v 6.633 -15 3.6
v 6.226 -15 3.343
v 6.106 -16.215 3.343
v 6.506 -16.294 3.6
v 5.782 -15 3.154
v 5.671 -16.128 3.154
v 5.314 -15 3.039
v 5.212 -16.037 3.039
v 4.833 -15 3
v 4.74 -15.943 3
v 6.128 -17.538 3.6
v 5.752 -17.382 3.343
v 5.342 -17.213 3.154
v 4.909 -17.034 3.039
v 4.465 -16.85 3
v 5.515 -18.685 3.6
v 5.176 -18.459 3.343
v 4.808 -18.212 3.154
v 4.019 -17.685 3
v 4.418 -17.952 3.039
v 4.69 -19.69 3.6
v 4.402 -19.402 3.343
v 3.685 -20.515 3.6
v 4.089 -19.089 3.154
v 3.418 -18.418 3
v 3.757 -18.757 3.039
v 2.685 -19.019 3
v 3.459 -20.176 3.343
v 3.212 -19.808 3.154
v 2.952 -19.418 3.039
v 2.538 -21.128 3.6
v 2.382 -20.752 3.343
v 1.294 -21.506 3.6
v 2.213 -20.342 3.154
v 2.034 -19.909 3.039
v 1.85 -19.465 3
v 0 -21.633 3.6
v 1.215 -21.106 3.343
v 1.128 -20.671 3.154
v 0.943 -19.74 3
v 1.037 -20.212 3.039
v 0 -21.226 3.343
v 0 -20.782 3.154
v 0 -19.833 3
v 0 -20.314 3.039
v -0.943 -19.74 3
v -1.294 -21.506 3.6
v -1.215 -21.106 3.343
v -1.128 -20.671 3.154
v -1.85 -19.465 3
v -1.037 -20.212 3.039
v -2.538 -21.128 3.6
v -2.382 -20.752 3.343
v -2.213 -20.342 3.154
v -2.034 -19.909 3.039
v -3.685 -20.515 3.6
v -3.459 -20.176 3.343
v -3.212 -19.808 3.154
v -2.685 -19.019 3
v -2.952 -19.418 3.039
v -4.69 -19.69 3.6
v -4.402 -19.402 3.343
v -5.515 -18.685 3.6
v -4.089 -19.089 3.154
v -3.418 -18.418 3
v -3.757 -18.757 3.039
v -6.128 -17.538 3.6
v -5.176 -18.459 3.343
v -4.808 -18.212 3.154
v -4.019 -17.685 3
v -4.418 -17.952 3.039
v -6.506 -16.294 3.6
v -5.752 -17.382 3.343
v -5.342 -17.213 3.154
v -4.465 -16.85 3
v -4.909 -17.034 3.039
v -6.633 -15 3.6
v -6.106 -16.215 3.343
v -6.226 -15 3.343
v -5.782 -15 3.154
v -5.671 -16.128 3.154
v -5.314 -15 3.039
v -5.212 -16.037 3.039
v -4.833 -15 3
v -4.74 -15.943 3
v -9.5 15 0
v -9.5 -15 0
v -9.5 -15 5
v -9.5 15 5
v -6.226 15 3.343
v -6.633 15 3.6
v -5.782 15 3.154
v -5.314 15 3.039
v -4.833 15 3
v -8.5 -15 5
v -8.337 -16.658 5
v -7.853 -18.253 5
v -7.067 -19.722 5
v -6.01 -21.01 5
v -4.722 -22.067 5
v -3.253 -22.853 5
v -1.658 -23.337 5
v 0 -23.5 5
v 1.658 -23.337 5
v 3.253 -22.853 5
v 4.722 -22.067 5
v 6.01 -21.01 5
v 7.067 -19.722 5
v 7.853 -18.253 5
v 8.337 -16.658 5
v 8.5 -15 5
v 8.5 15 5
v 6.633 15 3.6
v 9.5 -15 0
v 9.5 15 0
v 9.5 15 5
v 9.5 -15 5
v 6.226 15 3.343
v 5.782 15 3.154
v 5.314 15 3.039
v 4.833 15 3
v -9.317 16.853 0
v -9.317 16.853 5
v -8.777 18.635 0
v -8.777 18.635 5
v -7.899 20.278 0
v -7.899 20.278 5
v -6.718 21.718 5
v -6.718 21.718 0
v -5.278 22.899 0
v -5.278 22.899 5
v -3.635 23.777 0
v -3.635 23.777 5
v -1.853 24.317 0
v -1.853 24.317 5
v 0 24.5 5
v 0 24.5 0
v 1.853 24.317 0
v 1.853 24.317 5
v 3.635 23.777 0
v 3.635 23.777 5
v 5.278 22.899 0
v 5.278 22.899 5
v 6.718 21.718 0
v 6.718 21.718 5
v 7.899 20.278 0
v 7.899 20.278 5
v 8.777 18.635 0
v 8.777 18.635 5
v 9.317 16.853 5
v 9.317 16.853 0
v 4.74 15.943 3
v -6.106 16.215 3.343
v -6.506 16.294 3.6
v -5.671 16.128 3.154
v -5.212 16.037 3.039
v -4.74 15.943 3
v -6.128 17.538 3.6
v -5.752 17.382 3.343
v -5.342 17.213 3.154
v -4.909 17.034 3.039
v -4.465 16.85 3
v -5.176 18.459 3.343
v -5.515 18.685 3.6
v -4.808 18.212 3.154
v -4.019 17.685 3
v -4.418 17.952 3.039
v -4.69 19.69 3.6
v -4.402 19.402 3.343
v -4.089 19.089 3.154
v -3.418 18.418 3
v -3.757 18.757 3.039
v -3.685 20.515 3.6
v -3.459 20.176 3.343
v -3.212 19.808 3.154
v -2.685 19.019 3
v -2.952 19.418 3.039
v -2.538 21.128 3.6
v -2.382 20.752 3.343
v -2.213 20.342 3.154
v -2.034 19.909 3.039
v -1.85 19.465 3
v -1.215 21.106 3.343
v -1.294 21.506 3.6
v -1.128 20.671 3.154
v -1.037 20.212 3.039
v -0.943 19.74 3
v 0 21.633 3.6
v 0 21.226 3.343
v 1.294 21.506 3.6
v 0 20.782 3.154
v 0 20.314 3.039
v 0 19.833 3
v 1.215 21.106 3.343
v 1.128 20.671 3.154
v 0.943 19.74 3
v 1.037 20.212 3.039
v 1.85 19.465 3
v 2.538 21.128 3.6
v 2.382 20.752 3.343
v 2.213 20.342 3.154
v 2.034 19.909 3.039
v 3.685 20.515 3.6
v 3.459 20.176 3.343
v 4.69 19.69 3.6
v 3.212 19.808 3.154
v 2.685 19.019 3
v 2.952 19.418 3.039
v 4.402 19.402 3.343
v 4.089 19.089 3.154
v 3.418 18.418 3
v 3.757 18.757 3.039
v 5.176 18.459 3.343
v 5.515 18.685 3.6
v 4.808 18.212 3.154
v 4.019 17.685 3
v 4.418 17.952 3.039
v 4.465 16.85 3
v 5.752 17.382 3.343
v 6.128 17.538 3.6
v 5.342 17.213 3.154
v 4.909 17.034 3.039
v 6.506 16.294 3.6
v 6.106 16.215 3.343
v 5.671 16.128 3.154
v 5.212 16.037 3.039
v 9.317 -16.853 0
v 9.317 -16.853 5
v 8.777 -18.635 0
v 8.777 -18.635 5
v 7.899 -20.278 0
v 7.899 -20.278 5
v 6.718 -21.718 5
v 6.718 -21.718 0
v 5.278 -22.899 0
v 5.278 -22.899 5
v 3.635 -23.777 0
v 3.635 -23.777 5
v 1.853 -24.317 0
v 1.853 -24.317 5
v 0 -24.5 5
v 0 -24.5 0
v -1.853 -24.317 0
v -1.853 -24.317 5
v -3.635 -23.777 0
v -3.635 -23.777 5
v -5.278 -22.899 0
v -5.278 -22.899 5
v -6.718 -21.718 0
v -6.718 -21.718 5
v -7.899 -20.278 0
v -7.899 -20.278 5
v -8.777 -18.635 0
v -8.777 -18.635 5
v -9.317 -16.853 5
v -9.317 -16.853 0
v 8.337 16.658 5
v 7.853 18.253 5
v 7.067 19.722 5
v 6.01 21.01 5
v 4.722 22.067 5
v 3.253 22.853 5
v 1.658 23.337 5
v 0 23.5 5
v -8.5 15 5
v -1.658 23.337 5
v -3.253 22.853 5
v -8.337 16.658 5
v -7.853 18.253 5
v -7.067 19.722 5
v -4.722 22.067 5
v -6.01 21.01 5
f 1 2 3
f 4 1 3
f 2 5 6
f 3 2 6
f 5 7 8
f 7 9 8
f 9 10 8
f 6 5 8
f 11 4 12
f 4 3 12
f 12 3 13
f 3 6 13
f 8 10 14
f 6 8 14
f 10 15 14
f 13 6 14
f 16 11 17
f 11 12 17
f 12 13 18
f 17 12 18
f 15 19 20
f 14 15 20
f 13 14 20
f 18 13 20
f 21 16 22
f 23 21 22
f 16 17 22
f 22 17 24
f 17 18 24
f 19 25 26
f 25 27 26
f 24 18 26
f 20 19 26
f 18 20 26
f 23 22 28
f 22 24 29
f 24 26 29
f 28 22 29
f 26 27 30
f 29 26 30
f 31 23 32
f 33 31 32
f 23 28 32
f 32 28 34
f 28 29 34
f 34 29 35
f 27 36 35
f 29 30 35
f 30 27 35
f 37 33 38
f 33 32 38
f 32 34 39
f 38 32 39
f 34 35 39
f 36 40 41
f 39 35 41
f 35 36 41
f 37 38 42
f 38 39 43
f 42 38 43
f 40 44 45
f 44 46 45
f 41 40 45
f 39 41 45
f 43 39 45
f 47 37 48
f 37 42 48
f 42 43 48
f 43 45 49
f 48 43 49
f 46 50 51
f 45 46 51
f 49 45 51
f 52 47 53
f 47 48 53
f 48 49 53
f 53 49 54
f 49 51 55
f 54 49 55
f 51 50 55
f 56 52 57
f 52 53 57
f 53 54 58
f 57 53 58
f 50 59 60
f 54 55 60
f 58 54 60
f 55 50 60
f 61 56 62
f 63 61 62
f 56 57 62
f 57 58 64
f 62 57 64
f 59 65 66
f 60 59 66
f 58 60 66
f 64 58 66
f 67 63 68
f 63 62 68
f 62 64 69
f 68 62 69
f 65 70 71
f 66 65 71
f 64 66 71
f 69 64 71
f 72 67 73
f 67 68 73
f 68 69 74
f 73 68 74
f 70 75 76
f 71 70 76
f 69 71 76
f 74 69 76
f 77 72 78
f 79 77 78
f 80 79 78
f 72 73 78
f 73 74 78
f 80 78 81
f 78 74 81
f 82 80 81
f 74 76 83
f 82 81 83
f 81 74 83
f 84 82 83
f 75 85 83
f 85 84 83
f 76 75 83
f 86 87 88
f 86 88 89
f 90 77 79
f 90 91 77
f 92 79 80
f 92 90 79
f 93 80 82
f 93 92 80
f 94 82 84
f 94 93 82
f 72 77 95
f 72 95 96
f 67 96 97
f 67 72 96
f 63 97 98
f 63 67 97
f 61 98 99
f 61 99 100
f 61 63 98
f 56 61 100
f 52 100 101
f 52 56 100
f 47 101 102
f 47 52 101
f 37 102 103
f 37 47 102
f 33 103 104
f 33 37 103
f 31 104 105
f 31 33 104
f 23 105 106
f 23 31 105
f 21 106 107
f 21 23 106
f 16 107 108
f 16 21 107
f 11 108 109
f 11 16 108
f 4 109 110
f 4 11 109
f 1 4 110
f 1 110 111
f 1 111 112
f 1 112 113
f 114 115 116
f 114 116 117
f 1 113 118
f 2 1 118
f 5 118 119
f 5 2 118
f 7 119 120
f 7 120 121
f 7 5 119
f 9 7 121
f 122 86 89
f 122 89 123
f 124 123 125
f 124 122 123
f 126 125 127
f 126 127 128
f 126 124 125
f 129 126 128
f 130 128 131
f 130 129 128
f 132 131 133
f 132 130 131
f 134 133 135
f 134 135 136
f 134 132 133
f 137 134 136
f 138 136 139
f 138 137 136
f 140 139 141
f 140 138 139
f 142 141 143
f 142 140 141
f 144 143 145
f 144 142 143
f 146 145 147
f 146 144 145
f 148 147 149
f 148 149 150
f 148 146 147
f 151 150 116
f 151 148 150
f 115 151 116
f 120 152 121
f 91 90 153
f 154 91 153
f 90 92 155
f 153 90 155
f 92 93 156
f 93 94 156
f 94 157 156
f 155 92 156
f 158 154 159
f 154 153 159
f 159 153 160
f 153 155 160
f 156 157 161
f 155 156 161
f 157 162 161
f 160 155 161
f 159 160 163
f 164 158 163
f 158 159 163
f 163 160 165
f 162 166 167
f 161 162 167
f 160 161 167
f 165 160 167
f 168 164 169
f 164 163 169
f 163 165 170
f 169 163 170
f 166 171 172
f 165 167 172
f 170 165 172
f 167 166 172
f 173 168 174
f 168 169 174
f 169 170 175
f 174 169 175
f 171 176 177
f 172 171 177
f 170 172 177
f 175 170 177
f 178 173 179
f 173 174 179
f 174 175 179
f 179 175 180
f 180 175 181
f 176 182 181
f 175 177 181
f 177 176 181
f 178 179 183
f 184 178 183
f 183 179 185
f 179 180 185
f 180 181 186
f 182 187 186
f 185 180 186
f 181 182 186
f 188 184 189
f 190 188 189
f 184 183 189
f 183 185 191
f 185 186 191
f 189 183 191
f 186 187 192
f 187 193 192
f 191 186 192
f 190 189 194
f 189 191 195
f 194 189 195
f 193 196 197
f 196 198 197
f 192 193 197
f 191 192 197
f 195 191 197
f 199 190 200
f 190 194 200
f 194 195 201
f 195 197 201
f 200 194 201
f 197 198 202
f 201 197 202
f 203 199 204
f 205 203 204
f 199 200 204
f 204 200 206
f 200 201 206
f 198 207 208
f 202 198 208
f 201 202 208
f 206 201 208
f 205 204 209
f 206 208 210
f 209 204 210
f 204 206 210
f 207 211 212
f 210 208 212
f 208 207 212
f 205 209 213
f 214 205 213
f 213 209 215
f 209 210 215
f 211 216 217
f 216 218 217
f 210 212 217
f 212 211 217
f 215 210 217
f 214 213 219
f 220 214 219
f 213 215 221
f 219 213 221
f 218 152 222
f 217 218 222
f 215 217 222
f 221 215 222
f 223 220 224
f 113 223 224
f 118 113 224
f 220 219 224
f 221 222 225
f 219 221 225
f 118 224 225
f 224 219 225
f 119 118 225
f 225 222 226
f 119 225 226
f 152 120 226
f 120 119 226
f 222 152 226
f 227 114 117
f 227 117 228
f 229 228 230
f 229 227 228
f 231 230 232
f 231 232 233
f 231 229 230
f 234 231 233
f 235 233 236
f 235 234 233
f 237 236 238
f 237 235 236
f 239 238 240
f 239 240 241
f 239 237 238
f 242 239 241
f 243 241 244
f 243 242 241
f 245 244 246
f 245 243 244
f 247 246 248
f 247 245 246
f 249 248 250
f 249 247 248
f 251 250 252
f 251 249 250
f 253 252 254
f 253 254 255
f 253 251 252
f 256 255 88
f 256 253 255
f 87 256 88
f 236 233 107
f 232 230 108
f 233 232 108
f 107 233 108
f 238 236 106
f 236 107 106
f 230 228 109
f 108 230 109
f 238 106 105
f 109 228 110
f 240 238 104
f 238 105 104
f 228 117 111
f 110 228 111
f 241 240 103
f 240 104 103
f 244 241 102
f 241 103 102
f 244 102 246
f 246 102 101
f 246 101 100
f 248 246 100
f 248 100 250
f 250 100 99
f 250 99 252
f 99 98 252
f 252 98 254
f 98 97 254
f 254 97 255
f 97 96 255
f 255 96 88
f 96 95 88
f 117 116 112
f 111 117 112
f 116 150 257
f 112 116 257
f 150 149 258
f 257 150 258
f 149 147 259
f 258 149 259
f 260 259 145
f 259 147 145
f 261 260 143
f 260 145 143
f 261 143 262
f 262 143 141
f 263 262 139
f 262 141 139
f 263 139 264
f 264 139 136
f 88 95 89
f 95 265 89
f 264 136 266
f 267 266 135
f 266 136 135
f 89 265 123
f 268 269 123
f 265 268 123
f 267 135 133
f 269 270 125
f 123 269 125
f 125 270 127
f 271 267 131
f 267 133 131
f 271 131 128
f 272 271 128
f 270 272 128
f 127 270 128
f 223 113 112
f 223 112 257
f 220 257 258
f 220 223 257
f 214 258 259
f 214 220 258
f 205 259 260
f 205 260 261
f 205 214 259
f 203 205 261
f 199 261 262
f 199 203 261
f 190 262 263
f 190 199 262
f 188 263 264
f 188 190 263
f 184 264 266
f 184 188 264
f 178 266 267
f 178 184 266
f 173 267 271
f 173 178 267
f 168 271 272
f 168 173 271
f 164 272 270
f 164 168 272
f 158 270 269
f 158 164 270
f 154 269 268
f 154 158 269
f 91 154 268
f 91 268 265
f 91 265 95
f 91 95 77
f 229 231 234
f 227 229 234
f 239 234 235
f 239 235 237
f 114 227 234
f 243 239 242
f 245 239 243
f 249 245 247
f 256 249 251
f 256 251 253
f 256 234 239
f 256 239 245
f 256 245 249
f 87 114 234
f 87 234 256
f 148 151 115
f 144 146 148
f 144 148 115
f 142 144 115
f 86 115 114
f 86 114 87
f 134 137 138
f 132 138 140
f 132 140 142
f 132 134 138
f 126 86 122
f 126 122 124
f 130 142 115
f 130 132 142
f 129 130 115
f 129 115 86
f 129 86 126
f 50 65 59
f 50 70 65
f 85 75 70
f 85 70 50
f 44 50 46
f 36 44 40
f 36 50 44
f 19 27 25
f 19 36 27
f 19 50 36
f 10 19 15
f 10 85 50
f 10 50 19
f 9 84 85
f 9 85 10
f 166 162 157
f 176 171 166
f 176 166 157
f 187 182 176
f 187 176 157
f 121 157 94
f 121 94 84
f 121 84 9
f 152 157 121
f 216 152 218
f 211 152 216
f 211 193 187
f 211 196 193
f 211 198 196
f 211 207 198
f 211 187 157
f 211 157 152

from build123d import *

# Parameters (mm, degrees)
Y_KSEKLIK_EKSTR_ZYON1_DEPTH = 5
KES_EKSTR_ZYON1_DEPTH       = 2
PAH1_SIZE                   = 4
PAH1_SIZE_2                 = 3
RADYUS1_R                   = 3


with BuildPart() as part:
    # Çizim1 → Yükseklik-Ekstrüzyon1 (new body)
    with BuildSketch(Plane.XY):
        with BuildLine():
            Line((-9.5, -15), (-9.5, 15))
            ThreePointArc((-9.5, 15), (0, 24.5), (9.5, 15))
            Line((9.5, 15), (9.5, -15))
            ThreePointArc((9.5, -15), (0, -24.5), (-9.5, -15))
        make_face()
    extrude(amount=Y_KSEKLIK_EKSTR_ZYON1_DEPTH)

    # Çizim2 → Kes-Ekstrüzyon1 (cut)
    with BuildSketch(Plane.XY.offset(5)):
        with BuildLine():
            Line((-4.5, 15), (-4.5, -15))
            ThreePointArc((-4.5, -15), (0, -19.5), (4.5, -15))
            Line((4.5, -15), (4.5, 15))
            ThreePointArc((4.5, 15), (0, 19.5), (-4.5, 15))
        make_face()
    extrude(amount=-KES_EKSTR_ZYON1_DEPTH, mode=Mode.SUBTRACT)

    # Pah1
    # the kernel refuses this chamfer: 4, 3 mm, written as the material it takes off along each edge
    with BuildSketch(Plane(origin=(0, -15, 5), x_dir=(-1, 0, 0), z_dir=(0, 1, 0))) as pah1_piece_1_section:
        Polygon((4.5 + PAH1_SIZE, 0), (4.5, -PAH1_SIZE_2), (4.5, 0), align=None)
    pah1_piece_1 = revolve(axis=Axis((0, -15, 5), (0, 0, 1)), revolution_arc=180, mode=Mode.PRIVATE)
    pah1_piece_1 = split(pah1_piece_1, bisect_by=Plane(origin=(0, -22.201904041, 3), z_dir=(0, 0, 1)), keep=Keep.TOP, mode=Mode.PRIVATE)
    add(pah1_piece_1, mode=Mode.SUBTRACT)
    with BuildSketch(Plane(origin=(4.5, -15, 5), x_dir=(0.9997296931968459, 0, 0.023249527748763873), z_dir=(0, 1, 0))) as pah1_piece_2_section:
        Polygon((PAH1_SIZE * 0.999729693197, PAH1_SIZE * 0.0232495277488), (-PAH1_SIZE_2 * 0.0232495277488, PAH1_SIZE_2 * 0.999729693197), (0, 0), align=None)
    pah1_piece_2 = extrude(amount=30, mode=Mode.PRIVATE)
    pah1_piece_2 = split(pah1_piece_2, bisect_by=Plane(origin=(5.968375105, 0, 3), z_dir=(0, 0, 1)), keep=Keep.TOP, mode=Mode.PRIVATE)
    add(pah1_piece_2, mode=Mode.SUBTRACT)
    with BuildSketch(Plane(origin=(-4.5, 15, 5), x_dir=(-0.9997296931968459, 0, 0.023249527748763883), z_dir=(0, -1, 0))) as pah1_piece_3_section:
        Polygon((PAH1_SIZE * 0.999729693197, PAH1_SIZE * 0.0232495277488), (-PAH1_SIZE_2 * 0.0232495277488, PAH1_SIZE_2 * 0.999729693197), (0, 0), align=None)
    pah1_piece_3 = extrude(amount=30, mode=Mode.PRIVATE)
    pah1_piece_3 = split(pah1_piece_3, bisect_by=Plane(origin=(-5.968375105, 0, 3), z_dir=(0, 0, 1)), keep=Keep.TOP, mode=Mode.PRIVATE)
    add(pah1_piece_3, mode=Mode.SUBTRACT)
    with BuildSketch(Plane(origin=(0, 15, 5), x_dir=(1, 0, 0), z_dir=(0, -1, 0))) as pah1_piece_4_section:
        Polygon((4.5 + PAH1_SIZE, 0), (4.5, -PAH1_SIZE_2), (4.5, 0), align=None)
    pah1_piece_4 = revolve(axis=Axis((0, 15, 5), (0, 0, 1)), revolution_arc=180, mode=Mode.PRIVATE)
    pah1_piece_4 = split(pah1_piece_4, bisect_by=Plane(origin=(0, 22.201904042, 3), z_dir=(0, 0, 1)), keep=Keep.TOP, mode=Mode.PRIVATE)
    add(pah1_piece_4, mode=Mode.SUBTRACT)

    # Radyus1
    radyus1_edges = [part.edges().sort_by_distance(p)[0] for p in [
        (0, -20.833333333, 3),
        (5.833333333, 0, 3),
        (-5.833333333, 0, 3),
        (0, 20.833333333, 3),
    ]]
    fillet(radyus1_edges, radius=RADYUS1_R)


solid = part.part
